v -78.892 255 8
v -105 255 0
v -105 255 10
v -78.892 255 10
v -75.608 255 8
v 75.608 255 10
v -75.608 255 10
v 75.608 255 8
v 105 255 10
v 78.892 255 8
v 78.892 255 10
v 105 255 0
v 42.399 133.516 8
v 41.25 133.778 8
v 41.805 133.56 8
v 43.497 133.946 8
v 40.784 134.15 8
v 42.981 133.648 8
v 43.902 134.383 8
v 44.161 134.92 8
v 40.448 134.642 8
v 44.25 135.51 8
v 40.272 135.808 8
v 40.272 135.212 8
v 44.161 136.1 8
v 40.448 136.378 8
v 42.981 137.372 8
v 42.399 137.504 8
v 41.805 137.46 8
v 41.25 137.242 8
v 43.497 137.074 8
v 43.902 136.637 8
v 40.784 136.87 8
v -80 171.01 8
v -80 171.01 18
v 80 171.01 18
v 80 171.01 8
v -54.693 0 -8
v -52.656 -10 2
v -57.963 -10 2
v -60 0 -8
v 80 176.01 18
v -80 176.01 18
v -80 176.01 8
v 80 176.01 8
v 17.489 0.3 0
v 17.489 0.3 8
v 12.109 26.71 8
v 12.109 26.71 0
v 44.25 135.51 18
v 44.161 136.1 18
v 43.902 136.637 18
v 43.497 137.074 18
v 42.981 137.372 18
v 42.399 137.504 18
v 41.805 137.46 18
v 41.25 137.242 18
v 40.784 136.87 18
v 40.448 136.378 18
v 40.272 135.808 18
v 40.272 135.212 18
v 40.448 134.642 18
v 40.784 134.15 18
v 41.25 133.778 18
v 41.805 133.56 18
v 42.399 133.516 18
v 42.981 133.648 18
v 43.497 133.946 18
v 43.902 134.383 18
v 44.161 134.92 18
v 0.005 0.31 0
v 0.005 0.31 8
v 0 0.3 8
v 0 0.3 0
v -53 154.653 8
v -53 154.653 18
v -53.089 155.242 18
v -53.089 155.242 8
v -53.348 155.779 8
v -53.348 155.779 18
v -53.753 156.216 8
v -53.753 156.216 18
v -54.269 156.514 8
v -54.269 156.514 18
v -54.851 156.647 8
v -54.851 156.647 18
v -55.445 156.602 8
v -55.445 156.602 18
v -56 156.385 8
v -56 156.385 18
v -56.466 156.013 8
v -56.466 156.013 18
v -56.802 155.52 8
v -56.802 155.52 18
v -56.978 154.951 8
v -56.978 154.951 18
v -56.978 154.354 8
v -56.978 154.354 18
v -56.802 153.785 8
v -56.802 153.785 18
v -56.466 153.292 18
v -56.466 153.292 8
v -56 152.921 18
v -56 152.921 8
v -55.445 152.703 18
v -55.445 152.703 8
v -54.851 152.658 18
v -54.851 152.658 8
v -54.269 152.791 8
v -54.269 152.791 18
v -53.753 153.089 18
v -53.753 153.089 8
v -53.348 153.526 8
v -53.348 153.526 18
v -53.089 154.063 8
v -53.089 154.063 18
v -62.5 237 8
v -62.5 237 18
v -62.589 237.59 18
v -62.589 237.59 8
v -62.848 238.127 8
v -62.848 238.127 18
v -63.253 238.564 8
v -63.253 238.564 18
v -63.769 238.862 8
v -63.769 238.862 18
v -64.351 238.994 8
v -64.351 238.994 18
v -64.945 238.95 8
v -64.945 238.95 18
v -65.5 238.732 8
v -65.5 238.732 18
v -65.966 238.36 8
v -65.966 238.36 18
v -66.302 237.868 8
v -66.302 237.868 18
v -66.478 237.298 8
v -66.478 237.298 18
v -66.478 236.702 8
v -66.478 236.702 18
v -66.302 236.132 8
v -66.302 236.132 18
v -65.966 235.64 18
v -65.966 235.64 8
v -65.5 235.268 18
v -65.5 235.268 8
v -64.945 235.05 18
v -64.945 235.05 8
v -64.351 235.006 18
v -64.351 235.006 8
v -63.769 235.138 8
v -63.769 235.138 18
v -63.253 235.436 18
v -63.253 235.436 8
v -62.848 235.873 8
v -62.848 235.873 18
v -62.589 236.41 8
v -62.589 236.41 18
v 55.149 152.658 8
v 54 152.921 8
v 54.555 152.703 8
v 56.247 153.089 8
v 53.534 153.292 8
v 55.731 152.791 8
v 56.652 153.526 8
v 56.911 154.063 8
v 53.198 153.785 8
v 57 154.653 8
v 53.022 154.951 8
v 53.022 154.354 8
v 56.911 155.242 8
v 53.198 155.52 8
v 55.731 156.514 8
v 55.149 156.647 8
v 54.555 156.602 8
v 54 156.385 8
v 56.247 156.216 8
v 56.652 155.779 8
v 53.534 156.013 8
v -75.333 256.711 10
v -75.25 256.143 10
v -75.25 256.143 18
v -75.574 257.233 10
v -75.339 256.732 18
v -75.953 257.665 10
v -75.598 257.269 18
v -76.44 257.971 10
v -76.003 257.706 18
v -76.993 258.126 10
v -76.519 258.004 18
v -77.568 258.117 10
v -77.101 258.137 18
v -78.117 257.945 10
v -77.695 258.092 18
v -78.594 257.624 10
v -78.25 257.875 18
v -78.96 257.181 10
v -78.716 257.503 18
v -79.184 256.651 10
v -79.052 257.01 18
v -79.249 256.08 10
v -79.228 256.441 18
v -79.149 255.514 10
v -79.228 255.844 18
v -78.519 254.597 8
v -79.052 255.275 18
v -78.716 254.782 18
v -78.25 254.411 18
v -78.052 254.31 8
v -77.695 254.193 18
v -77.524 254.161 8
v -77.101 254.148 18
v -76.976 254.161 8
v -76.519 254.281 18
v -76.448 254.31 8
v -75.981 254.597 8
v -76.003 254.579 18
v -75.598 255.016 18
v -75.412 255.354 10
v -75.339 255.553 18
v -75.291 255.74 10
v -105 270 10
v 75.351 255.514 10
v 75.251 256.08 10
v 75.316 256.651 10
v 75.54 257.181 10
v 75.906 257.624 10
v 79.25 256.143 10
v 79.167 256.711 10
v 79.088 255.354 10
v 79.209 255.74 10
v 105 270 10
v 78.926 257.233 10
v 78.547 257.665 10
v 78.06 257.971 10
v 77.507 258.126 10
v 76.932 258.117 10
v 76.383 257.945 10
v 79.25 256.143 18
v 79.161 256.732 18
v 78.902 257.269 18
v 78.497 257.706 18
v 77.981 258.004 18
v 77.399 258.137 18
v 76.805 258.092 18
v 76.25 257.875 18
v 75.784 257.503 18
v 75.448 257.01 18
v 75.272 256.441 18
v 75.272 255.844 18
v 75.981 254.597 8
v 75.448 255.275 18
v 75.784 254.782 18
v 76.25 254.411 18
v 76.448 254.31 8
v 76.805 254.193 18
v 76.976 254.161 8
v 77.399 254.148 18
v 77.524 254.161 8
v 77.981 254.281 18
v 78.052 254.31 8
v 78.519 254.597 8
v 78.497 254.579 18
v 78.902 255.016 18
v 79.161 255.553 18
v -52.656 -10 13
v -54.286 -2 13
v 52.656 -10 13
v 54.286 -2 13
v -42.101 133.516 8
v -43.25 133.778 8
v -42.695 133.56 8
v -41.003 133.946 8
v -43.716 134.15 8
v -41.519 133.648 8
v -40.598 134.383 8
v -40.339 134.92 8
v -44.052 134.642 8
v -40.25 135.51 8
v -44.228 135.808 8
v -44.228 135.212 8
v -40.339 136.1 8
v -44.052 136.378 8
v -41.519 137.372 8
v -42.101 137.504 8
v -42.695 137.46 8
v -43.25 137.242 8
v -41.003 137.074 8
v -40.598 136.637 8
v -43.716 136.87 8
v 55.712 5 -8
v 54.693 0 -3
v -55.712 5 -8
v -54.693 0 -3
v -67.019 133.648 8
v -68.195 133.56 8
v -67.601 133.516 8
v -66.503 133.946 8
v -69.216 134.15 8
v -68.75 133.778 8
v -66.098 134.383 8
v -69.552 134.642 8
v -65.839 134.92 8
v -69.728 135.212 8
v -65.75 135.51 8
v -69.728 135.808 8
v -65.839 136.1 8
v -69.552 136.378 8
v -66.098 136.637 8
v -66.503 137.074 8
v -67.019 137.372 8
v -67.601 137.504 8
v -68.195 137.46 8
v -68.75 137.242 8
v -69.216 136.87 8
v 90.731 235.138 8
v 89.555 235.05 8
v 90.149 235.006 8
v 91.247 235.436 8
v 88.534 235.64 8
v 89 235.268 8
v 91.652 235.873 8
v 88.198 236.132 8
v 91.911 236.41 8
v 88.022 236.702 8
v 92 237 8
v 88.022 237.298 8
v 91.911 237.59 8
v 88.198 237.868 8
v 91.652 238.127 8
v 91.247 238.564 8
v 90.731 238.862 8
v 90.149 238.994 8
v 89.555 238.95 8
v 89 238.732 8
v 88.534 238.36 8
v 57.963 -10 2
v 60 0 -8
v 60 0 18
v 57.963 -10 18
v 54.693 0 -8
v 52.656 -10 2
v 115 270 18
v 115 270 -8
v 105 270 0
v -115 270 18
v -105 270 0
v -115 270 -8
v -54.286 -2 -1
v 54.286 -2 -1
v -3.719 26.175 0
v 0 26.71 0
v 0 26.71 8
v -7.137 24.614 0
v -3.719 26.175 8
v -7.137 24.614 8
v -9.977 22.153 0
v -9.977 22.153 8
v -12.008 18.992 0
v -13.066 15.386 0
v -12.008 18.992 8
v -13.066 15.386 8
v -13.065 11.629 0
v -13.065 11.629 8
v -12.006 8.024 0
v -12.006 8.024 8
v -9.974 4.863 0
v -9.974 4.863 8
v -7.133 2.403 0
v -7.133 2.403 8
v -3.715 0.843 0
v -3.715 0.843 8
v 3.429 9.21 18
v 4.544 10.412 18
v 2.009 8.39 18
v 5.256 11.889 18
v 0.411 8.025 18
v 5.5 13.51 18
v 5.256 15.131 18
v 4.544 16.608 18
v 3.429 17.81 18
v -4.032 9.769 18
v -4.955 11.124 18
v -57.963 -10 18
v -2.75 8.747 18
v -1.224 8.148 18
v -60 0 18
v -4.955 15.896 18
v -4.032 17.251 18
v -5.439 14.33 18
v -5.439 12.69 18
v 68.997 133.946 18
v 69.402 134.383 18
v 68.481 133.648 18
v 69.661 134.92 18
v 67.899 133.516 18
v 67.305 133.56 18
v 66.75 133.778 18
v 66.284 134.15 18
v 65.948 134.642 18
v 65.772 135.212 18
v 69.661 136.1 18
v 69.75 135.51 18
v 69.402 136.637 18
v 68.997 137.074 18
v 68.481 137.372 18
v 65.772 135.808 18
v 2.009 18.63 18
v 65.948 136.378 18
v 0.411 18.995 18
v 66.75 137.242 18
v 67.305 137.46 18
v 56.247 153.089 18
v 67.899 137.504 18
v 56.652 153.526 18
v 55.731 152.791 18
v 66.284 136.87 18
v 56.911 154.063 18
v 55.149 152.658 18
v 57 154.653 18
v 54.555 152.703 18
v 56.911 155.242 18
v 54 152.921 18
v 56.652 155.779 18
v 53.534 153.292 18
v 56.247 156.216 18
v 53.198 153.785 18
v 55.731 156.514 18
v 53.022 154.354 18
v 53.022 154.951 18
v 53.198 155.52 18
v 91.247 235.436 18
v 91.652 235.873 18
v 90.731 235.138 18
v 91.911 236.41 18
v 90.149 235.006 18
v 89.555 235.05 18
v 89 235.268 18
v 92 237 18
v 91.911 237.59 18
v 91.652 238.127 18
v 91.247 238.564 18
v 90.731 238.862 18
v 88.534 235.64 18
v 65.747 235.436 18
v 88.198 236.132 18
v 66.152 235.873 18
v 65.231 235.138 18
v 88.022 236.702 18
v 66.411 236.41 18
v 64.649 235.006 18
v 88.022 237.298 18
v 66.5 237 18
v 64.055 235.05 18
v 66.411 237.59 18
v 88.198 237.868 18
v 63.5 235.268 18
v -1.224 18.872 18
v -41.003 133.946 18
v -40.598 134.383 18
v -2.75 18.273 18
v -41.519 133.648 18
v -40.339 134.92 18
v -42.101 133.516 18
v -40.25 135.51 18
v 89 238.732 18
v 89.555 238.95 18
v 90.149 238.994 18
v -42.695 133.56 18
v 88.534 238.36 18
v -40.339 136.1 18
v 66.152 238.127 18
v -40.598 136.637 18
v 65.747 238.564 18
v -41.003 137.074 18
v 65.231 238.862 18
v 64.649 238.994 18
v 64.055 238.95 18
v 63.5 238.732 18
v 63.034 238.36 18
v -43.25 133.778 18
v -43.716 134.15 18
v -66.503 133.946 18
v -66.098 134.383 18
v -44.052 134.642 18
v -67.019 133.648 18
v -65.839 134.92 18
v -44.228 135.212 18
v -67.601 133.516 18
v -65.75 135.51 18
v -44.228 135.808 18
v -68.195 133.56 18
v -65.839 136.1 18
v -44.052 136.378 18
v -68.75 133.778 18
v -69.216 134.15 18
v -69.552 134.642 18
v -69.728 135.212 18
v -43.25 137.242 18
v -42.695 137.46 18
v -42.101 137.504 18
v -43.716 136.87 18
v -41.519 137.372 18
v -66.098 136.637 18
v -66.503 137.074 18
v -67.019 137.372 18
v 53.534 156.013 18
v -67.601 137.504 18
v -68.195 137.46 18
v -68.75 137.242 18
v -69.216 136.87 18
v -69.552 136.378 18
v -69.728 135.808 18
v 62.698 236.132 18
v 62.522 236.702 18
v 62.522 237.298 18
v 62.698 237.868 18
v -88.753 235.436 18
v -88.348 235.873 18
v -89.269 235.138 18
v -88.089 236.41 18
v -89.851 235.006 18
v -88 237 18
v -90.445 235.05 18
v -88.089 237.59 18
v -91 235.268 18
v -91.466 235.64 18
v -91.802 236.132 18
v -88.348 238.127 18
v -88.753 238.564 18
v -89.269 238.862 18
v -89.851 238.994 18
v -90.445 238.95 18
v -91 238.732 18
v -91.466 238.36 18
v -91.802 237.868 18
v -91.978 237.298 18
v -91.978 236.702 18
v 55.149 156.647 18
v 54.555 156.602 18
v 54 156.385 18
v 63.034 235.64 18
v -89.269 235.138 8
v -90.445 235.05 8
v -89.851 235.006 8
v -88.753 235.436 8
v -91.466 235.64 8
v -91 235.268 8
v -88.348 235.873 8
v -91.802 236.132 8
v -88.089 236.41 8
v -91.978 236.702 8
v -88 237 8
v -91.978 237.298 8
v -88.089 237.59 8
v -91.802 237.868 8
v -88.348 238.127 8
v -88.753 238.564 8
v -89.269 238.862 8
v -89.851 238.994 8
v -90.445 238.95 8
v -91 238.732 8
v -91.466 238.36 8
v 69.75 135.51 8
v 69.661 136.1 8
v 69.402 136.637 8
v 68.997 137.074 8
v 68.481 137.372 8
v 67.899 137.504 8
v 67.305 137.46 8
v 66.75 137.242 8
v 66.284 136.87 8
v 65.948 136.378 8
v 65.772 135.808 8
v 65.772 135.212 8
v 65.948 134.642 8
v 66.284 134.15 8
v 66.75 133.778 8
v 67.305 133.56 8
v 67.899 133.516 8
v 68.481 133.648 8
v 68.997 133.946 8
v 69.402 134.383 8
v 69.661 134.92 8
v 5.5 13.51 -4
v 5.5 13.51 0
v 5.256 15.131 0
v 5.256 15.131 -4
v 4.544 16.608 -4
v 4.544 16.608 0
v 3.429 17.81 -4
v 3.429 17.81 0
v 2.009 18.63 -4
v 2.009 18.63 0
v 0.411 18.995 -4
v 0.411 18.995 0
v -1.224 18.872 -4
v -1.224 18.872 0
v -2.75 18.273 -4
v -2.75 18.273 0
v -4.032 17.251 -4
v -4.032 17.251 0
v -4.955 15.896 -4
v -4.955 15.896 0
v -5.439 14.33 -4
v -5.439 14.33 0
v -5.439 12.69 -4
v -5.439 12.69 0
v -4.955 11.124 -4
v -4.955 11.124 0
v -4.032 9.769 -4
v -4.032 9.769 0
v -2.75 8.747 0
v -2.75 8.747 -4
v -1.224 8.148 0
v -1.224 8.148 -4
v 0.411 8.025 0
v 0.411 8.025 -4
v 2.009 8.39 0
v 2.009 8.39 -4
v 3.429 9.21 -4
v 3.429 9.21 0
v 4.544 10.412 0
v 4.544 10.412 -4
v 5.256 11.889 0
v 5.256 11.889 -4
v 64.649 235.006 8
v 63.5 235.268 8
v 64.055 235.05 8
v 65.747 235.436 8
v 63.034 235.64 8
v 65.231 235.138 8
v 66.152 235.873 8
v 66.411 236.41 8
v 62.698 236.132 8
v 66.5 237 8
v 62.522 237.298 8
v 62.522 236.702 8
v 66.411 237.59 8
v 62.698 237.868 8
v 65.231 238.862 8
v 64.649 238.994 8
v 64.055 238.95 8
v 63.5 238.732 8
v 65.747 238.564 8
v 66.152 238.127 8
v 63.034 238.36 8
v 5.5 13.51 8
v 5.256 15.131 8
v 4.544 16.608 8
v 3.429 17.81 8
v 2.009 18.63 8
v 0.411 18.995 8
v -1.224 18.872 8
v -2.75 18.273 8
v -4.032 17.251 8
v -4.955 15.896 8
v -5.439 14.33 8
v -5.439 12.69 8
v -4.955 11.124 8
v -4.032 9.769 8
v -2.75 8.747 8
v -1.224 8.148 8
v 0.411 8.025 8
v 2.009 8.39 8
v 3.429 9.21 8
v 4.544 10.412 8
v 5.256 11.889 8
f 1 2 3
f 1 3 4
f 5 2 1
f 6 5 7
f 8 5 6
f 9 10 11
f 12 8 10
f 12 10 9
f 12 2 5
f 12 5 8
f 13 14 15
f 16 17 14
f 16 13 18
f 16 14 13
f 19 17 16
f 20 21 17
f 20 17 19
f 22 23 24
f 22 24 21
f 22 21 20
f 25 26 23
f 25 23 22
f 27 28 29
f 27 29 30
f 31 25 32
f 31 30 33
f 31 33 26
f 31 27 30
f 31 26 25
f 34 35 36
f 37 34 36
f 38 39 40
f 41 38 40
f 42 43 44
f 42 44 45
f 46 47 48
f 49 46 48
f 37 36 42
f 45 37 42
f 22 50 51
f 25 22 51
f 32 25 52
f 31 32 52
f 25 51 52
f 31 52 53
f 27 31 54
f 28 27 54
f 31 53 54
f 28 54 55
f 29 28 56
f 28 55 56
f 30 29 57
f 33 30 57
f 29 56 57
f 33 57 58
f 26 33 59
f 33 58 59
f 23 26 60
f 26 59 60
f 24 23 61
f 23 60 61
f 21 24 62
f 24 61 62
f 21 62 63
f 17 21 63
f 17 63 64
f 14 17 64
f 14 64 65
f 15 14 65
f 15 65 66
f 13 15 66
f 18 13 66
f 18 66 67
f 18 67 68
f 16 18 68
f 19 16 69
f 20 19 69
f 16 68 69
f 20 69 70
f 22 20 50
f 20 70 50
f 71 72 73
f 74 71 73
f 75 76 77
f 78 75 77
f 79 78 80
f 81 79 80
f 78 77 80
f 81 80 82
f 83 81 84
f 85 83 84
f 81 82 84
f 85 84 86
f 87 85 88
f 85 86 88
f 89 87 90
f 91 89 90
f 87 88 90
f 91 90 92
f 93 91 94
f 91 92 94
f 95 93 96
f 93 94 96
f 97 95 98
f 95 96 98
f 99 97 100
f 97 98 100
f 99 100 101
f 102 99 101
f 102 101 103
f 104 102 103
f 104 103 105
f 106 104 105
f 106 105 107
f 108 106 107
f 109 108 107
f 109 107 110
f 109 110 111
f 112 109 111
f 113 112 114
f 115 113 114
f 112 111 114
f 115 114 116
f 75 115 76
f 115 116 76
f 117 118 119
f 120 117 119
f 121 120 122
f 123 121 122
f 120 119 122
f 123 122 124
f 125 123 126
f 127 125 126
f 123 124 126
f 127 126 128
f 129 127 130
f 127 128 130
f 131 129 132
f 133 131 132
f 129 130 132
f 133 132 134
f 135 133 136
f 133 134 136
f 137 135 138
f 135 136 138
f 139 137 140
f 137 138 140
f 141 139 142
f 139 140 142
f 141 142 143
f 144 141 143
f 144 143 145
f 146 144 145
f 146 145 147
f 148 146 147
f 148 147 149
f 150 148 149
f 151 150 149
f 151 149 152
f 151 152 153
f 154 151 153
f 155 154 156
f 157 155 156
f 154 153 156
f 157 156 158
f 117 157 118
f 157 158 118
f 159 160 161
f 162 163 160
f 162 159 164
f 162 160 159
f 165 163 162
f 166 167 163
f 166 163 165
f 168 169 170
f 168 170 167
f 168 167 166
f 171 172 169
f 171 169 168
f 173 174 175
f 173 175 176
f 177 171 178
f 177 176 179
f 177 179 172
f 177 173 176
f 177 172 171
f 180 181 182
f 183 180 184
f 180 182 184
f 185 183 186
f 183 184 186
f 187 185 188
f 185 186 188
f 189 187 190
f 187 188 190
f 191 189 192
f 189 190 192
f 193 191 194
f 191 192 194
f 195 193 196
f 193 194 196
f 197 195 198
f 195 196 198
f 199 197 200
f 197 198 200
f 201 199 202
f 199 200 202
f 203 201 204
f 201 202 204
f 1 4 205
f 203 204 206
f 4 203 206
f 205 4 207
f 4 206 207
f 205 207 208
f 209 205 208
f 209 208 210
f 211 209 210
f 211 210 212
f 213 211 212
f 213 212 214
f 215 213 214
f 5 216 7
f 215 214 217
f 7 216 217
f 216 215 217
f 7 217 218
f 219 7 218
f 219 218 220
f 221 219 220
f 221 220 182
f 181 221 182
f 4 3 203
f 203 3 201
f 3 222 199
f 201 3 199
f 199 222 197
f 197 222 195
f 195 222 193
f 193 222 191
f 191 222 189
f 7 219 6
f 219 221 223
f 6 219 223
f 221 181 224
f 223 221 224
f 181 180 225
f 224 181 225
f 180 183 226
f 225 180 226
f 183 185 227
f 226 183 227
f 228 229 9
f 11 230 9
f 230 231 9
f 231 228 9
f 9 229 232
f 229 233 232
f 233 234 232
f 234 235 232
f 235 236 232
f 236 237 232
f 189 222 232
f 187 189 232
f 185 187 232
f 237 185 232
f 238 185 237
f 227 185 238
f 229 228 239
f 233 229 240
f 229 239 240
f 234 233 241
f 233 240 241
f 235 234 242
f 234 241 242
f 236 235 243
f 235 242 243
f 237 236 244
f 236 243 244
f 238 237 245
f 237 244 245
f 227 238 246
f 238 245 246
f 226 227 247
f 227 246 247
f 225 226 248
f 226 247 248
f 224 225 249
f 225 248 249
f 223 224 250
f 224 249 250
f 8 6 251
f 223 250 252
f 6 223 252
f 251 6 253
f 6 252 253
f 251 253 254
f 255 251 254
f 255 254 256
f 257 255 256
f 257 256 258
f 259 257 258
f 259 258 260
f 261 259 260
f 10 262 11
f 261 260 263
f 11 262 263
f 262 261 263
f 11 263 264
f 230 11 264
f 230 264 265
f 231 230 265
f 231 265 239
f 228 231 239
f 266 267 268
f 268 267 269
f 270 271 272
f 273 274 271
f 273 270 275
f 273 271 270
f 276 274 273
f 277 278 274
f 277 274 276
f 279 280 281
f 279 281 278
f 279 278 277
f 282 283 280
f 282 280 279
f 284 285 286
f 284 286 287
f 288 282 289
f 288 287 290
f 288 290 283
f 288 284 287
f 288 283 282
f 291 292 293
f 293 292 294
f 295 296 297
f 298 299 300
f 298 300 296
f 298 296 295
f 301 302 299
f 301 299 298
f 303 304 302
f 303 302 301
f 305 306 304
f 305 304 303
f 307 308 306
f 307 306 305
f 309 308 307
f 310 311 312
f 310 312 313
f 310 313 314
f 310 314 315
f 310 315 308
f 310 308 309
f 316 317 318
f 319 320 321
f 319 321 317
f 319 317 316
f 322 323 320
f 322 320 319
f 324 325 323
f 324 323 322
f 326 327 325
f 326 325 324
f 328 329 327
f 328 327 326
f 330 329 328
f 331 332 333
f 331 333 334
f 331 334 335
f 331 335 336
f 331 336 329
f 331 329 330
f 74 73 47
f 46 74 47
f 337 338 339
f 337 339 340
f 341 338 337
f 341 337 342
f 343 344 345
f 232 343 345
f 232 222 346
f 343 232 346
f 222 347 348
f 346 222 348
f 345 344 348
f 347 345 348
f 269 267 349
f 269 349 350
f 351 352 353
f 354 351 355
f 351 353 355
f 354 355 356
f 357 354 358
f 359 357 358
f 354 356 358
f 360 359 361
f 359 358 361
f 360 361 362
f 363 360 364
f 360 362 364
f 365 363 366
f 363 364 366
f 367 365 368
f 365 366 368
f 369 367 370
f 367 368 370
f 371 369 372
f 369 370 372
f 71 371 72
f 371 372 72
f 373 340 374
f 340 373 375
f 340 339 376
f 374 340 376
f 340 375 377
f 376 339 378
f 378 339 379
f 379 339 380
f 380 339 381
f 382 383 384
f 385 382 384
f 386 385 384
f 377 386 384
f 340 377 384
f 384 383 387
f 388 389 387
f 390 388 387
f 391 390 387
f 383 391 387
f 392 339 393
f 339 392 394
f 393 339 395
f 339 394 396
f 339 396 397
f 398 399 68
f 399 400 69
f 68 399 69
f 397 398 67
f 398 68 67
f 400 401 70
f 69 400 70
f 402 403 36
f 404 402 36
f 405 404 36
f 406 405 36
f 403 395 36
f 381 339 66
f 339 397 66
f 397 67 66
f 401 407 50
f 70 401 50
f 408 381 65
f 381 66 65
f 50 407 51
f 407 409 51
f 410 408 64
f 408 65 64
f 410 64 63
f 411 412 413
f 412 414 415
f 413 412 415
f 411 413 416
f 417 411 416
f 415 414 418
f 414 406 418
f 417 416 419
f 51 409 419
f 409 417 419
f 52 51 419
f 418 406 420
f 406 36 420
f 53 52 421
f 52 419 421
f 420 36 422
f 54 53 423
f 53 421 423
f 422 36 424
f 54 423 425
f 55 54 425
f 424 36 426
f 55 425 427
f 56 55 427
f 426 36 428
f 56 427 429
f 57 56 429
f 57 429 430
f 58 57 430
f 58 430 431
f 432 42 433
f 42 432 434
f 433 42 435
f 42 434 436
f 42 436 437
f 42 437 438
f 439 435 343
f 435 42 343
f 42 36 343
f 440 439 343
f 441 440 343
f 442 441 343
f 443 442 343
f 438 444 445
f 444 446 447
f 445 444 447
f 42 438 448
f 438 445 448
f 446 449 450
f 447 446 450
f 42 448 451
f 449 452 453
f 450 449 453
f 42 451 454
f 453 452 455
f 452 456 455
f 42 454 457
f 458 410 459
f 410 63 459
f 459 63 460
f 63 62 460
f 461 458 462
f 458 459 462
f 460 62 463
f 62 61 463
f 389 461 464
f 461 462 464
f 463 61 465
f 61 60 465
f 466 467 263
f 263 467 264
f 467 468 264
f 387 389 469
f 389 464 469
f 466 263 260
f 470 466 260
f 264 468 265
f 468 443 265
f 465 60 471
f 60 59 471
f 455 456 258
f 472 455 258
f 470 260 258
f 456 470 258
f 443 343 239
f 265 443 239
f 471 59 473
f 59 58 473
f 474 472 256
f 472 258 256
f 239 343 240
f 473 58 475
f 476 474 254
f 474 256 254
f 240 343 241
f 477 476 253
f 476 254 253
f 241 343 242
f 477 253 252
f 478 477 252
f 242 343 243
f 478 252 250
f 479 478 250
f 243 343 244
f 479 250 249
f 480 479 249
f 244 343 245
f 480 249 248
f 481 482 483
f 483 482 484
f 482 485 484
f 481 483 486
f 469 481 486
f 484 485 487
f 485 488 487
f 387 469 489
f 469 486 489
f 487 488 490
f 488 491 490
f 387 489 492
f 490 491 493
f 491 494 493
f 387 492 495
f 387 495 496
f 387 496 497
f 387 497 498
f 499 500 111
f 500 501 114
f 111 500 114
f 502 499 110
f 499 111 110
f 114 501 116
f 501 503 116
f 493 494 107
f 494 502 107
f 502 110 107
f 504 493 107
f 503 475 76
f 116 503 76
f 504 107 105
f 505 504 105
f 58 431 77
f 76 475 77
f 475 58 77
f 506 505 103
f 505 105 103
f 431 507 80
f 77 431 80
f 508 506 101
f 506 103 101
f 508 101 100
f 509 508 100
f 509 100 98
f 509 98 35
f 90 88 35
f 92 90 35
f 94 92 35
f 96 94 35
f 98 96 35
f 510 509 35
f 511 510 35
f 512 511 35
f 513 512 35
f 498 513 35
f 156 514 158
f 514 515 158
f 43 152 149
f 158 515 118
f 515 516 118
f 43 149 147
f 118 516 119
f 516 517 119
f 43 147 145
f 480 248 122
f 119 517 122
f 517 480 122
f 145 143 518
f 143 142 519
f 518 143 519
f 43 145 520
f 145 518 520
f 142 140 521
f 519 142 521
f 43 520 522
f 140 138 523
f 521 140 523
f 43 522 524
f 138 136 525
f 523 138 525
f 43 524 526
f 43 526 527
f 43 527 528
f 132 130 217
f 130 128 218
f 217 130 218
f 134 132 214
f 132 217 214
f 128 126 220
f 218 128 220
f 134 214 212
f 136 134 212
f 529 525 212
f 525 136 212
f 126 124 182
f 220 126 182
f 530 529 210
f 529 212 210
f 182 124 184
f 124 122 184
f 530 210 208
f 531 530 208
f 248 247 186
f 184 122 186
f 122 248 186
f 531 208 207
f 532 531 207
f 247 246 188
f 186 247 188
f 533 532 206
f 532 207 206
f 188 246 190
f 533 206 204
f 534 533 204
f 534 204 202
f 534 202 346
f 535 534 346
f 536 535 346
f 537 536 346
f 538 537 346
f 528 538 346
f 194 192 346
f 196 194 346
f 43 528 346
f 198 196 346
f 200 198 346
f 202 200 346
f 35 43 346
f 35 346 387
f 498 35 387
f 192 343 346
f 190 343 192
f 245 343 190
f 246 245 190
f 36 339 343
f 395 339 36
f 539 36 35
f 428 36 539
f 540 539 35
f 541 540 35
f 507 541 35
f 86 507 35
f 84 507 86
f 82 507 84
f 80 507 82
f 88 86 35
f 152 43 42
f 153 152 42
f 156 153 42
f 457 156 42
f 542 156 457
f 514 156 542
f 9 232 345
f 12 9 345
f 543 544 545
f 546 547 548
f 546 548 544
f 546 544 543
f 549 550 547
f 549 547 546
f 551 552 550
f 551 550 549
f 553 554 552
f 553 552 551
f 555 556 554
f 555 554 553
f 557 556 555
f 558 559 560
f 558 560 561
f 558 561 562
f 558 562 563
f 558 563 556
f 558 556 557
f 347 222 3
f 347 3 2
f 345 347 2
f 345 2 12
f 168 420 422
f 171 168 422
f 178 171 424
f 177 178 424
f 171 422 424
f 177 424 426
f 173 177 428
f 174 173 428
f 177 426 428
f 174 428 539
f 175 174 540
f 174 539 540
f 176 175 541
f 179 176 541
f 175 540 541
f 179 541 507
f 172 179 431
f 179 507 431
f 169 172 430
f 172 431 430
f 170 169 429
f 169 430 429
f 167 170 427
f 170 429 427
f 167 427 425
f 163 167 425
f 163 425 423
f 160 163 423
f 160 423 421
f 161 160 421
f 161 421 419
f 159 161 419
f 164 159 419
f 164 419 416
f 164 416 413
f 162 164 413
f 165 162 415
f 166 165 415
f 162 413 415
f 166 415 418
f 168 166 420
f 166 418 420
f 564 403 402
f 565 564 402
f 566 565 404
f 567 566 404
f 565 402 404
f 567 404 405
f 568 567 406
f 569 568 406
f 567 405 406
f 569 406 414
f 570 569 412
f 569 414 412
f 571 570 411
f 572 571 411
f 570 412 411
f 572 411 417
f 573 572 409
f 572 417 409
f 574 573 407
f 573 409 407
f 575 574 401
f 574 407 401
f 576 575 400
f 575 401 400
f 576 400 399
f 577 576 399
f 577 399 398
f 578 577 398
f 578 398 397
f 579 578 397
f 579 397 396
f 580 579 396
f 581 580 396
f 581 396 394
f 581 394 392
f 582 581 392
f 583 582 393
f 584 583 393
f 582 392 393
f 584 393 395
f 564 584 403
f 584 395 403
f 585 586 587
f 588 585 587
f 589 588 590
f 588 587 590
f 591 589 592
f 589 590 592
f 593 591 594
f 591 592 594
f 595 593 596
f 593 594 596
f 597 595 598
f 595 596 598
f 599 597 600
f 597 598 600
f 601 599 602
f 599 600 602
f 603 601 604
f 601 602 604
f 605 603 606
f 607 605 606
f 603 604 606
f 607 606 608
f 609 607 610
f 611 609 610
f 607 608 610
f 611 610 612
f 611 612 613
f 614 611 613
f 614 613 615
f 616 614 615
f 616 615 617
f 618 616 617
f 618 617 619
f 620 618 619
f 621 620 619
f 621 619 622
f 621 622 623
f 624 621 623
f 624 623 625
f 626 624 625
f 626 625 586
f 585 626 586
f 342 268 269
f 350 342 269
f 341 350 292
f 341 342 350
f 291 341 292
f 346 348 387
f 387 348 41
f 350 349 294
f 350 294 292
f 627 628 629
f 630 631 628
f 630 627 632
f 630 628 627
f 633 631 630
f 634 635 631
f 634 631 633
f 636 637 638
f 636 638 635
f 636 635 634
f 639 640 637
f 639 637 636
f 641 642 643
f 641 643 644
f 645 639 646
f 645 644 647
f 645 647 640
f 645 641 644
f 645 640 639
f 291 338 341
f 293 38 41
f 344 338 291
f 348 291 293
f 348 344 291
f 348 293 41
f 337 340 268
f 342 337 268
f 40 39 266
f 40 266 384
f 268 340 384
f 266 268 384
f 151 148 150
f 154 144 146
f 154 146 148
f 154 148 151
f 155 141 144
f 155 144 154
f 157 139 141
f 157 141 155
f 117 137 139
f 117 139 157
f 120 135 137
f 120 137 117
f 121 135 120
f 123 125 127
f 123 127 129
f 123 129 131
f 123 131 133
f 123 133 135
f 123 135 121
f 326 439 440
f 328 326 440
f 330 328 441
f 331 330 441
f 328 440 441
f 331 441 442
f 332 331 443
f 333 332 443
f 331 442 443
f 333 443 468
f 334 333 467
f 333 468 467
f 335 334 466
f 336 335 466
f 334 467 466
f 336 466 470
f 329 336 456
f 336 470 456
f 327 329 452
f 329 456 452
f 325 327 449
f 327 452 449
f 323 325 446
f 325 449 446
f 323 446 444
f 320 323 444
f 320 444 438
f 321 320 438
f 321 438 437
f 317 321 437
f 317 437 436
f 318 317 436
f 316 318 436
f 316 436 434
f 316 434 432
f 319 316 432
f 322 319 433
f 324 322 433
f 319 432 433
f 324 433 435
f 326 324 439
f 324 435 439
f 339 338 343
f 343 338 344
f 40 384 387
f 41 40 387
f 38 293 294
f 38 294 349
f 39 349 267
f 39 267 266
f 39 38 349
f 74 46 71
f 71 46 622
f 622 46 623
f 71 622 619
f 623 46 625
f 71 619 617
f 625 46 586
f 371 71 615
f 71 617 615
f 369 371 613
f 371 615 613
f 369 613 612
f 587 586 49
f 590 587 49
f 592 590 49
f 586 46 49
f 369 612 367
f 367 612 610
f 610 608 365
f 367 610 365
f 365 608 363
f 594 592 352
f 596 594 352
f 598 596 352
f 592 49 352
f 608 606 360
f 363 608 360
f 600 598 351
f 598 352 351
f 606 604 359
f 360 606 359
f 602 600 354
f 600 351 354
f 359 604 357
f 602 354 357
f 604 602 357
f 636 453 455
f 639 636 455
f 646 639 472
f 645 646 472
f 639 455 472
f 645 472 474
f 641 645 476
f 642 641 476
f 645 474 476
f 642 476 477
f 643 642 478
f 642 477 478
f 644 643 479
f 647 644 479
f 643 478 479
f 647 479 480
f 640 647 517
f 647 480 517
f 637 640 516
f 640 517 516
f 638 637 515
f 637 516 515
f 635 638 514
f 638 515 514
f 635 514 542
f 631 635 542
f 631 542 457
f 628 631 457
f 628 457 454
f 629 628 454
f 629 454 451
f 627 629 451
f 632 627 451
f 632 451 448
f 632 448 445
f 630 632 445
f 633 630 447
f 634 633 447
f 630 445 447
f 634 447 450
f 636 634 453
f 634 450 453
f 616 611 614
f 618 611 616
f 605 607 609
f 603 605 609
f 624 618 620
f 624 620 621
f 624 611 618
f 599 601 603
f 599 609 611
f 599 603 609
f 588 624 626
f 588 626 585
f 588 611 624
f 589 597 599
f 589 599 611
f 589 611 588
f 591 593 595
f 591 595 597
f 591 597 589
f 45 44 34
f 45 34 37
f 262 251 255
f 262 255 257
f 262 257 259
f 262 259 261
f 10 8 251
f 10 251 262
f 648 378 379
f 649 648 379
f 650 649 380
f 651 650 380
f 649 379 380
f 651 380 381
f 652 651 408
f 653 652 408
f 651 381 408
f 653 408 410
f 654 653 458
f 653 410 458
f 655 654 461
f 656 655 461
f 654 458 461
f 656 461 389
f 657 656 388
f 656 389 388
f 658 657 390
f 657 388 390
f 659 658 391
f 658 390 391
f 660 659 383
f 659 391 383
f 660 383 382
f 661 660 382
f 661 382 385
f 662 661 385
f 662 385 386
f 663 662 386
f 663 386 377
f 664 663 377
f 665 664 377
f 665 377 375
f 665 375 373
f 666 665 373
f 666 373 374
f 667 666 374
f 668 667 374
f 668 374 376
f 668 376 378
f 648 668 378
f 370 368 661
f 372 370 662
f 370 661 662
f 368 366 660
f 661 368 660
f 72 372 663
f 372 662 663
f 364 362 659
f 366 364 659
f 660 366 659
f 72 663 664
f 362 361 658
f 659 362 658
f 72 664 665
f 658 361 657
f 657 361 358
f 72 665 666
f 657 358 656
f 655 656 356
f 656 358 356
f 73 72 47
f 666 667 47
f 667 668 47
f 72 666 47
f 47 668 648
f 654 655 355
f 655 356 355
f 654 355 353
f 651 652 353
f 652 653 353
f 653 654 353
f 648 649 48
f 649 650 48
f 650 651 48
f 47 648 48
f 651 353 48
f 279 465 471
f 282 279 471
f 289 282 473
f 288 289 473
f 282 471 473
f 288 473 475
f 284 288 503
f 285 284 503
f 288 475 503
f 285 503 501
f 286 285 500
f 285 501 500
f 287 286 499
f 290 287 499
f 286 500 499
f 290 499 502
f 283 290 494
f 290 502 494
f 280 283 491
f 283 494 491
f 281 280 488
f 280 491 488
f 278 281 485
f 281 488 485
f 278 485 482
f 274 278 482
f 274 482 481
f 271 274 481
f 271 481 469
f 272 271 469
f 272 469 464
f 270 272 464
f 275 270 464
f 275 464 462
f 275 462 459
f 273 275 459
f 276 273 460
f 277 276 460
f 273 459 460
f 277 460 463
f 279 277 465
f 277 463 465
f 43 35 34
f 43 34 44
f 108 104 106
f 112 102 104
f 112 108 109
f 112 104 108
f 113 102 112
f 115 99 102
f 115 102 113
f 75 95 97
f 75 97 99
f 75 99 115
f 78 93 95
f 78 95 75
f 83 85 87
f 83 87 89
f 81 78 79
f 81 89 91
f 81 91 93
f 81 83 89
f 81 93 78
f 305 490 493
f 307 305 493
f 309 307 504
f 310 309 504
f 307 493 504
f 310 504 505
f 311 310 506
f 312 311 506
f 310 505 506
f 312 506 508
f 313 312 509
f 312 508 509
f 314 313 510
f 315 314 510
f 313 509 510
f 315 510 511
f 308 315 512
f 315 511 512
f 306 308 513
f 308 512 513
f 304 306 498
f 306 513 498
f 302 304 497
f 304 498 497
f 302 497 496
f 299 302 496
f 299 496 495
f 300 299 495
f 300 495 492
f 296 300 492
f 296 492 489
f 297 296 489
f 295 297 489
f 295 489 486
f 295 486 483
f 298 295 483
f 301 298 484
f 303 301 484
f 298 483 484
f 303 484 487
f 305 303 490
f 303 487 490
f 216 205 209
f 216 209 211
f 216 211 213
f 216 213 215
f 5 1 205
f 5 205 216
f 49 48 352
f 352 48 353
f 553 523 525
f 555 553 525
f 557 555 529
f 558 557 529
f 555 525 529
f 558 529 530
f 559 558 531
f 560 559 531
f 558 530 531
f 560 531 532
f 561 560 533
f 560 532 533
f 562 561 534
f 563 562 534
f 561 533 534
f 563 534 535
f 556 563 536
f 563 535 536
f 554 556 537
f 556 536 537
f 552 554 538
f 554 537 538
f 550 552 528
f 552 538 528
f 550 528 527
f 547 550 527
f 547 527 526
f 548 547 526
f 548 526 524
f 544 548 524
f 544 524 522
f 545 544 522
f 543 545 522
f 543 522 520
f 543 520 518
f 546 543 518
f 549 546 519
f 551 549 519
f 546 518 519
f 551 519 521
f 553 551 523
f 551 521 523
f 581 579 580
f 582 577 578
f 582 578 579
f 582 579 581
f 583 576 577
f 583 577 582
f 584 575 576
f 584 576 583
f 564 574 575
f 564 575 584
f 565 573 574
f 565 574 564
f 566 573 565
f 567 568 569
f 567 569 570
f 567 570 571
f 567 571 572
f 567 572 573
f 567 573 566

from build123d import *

# Parameters (mm, degrees)
EXTRUDE_1_DEPTH     = 8
CUT_EXTRUDE_1_DEPTH = 8.5
EXTRUDE_2_DEPTH     = 8
EXTRUDE_3_DEPTH     = 10
SKETCH_7_R          = 5.5
CUT_EXTRUDE_2_DEPTH = 22
EXTRUDE_5_DEPTH     = 26
CUT_EXTRUDE_4_DEPTH = 21
CHAMFER_6_SIZE      = 5
CHAMFER_8_SIZE      = 10
SKETCH_13_W         = 210
SKETCH_13_H         = 10
CUT_EXTRUDE_5_DEPTH = 15
SKETCH_14_W         = 160
SKETCH_14_H         = 5
CUT_EXTRUDE_6_DEPTH = 10
SKETCH_16_R         = 2
CUT_EXTRUDE_7_DEPTH = 10
SKETCH_18_W         = 109.386418102
SKETCH_18_H         = 16
EXTRUDE_7_DEPTH     = 2
CHAMFER_10_SIZE     = 2


with BuildPart() as part:
    # 草图1 → 凸台-拉伸1 (new body)
    with BuildSketch(Plane.XY):
        Polygon((-60, 0), (60, 0), (115, 270), (-115, 270), align=None)
    extrude(amount=EXTRUDE_1_DEPTH)

    # 草图2 → 切除-拉伸1 (cut)
    with BuildSketch(Plane.XY.offset(8)):
        with BuildLine():
            Line((0.005000474, 0.310000947), (0, 0.3))
            Line((0, 0.3), (17.48870838, 0.3))
            Line((17.48870838, 0.3), (12.108893566, 26.71))
            Line((12.108893566, 26.71), (0, 26.71))
            ThreePointArc((0, 26.71), (-13.199999763, 13.507499763), (0.005000474, 0.310000947))
        make_face()
    extrude(amount=-CUT_EXTRUDE_1_DEPTH, mode=Mode.SUBTRACT)

    # 草图5 → 凸台-拉伸2 (add)
    with BuildSketch(Plane(origin=(0, 0, 0), x_dir=(-1, 0, 0), z_dir=(0, 0, -1))):
        Polygon((60, 0), (115, 270), (-115, 270), (-60, 0), align=None)
    extrude(amount=EXTRUDE_2_DEPTH)

    # 草图6 → 凸台-拉伸3 (add)
    with BuildSketch(Plane.XY.offset(8)):
        Polygon((-115, 270), (-60, 0), (60, 0), (115, 270), align=None)
    extrude(amount=EXTRUDE_3_DEPTH)

    # 草图7 → 切除-拉伸2 (cut)
    with BuildSketch(Plane.XY.offset(18)):
        with Locations((0, 13.51)):
            Circle(SKETCH_7_R)
    extrude(amount=-CUT_EXTRUDE_2_DEPTH, mode=Mode.SUBTRACT)

    # 草图9 → 凸台-拉伸5 (add)
    with BuildSketch(Plane.XY.offset(18)):
        Polygon((-57.962962963, -10), (-60, 0), (60, 0), (57.962962963, -10), align=None)
    extrude(amount=-EXTRUDE_5_DEPTH)

    # 草图12 → 切除-拉伸4 (cut)
    with BuildSketch(Plane.XY.offset(-8)):
        Polygon((54.693209051, 0), (-54.693209051, 0), (-52.656172014, -10), (52.656172014, -10), align=None)
    extrude(amount=CUT_EXTRUDE_4_DEPTH, mode=Mode.SUBTRACT)

    # 倒角6
    chamfer_6_edges = [part.edges().sort_by_distance(p)[0] for p in [
        (0, 0, -8),
    ]]
    chamfer(chamfer_6_edges, length=CHAMFER_6_SIZE)

    # 倒角8
    chamfer_8_edges = [part.edges().sort_by_distance(p)[0] for p in [
        (55.309567488, -10, -8),
        (-55.309567488, -10, -8),
    ]]
    chamfer(chamfer_8_edges, length=CHAMFER_8_SIZE)

    # 草图13 → 切除-拉伸5 (cut)
    with BuildSketch(Plane(origin=(0, 270, 0), x_dir=(1, 0, 0), z_dir=(0, 1, 0))):
        with Locations((0, -5)):
            Rectangle(SKETCH_13_W, SKETCH_13_H)
    extrude(amount=-CUT_EXTRUDE_5_DEPTH, mode=Mode.SUBTRACT)

    # 草图14 → 切除-拉伸6 (cut)
    with BuildSketch(Plane.XY.offset(18)):
        with Locations((0, 173.51)):
            Rectangle(SKETCH_14_W, SKETCH_14_H)
    extrude(amount=-CUT_EXTRUDE_6_DEPTH, mode=Mode.SUBTRACT)

    # 草图16 → 切除-拉伸7 (cut)
    with BuildSketch(Plane.XY.offset(18)):
        with Locations((-77.25, 256.1425573)):
            Circle(SKETCH_16_R)
        with Locations((-90, 237)):
            Circle(SKETCH_16_R)
        with Locations((-64.5, 237)):
            Circle(SKETCH_16_R)
        with Locations((77.25, 256.1425573)):
            Circle(SKETCH_16_R)
        with Locations((64.5, 237)):
            Circle(SKETCH_16_R)
        with Locations((90, 237)):
            Circle(SKETCH_16_R)
        with Locations((-55, 154.6525573)):
            Circle(SKETCH_16_R)
        with Locations((-42.25, 135.51)):
            Circle(SKETCH_16_R)
        with Locations((55, 154.6525573)):
            Circle(SKETCH_16_R)
        with Locations((42.25, 135.51)):
            Circle(SKETCH_16_R)
        with Locations((67.75, 135.51)):
            Circle(SKETCH_16_R)
        with Locations((-67.75, 135.51)):
            Circle(SKETCH_16_R)
    extrude(amount=-CUT_EXTRUDE_7_DEPTH, mode=Mode.SUBTRACT)

    # 草图18 → 凸台-拉伸7 (add)
    with BuildSketch(Plane.XZ):
        with Locations((0, 5)):
            Rectangle(SKETCH_18_W, SKETCH_18_H)
    extrude(amount=EXTRUDE_7_DEPTH)

    # 倒角10
    chamfer_10_edges = [part.edges().sort_by_distance(p)[0] for p in [
        (0, -2, -3),
    ]]
    chamfer(chamfer_10_edges, length=CHAMFER_10_SIZE - 0.0001)  # a hair under: the kernel refuses the full size


solid = part.part
